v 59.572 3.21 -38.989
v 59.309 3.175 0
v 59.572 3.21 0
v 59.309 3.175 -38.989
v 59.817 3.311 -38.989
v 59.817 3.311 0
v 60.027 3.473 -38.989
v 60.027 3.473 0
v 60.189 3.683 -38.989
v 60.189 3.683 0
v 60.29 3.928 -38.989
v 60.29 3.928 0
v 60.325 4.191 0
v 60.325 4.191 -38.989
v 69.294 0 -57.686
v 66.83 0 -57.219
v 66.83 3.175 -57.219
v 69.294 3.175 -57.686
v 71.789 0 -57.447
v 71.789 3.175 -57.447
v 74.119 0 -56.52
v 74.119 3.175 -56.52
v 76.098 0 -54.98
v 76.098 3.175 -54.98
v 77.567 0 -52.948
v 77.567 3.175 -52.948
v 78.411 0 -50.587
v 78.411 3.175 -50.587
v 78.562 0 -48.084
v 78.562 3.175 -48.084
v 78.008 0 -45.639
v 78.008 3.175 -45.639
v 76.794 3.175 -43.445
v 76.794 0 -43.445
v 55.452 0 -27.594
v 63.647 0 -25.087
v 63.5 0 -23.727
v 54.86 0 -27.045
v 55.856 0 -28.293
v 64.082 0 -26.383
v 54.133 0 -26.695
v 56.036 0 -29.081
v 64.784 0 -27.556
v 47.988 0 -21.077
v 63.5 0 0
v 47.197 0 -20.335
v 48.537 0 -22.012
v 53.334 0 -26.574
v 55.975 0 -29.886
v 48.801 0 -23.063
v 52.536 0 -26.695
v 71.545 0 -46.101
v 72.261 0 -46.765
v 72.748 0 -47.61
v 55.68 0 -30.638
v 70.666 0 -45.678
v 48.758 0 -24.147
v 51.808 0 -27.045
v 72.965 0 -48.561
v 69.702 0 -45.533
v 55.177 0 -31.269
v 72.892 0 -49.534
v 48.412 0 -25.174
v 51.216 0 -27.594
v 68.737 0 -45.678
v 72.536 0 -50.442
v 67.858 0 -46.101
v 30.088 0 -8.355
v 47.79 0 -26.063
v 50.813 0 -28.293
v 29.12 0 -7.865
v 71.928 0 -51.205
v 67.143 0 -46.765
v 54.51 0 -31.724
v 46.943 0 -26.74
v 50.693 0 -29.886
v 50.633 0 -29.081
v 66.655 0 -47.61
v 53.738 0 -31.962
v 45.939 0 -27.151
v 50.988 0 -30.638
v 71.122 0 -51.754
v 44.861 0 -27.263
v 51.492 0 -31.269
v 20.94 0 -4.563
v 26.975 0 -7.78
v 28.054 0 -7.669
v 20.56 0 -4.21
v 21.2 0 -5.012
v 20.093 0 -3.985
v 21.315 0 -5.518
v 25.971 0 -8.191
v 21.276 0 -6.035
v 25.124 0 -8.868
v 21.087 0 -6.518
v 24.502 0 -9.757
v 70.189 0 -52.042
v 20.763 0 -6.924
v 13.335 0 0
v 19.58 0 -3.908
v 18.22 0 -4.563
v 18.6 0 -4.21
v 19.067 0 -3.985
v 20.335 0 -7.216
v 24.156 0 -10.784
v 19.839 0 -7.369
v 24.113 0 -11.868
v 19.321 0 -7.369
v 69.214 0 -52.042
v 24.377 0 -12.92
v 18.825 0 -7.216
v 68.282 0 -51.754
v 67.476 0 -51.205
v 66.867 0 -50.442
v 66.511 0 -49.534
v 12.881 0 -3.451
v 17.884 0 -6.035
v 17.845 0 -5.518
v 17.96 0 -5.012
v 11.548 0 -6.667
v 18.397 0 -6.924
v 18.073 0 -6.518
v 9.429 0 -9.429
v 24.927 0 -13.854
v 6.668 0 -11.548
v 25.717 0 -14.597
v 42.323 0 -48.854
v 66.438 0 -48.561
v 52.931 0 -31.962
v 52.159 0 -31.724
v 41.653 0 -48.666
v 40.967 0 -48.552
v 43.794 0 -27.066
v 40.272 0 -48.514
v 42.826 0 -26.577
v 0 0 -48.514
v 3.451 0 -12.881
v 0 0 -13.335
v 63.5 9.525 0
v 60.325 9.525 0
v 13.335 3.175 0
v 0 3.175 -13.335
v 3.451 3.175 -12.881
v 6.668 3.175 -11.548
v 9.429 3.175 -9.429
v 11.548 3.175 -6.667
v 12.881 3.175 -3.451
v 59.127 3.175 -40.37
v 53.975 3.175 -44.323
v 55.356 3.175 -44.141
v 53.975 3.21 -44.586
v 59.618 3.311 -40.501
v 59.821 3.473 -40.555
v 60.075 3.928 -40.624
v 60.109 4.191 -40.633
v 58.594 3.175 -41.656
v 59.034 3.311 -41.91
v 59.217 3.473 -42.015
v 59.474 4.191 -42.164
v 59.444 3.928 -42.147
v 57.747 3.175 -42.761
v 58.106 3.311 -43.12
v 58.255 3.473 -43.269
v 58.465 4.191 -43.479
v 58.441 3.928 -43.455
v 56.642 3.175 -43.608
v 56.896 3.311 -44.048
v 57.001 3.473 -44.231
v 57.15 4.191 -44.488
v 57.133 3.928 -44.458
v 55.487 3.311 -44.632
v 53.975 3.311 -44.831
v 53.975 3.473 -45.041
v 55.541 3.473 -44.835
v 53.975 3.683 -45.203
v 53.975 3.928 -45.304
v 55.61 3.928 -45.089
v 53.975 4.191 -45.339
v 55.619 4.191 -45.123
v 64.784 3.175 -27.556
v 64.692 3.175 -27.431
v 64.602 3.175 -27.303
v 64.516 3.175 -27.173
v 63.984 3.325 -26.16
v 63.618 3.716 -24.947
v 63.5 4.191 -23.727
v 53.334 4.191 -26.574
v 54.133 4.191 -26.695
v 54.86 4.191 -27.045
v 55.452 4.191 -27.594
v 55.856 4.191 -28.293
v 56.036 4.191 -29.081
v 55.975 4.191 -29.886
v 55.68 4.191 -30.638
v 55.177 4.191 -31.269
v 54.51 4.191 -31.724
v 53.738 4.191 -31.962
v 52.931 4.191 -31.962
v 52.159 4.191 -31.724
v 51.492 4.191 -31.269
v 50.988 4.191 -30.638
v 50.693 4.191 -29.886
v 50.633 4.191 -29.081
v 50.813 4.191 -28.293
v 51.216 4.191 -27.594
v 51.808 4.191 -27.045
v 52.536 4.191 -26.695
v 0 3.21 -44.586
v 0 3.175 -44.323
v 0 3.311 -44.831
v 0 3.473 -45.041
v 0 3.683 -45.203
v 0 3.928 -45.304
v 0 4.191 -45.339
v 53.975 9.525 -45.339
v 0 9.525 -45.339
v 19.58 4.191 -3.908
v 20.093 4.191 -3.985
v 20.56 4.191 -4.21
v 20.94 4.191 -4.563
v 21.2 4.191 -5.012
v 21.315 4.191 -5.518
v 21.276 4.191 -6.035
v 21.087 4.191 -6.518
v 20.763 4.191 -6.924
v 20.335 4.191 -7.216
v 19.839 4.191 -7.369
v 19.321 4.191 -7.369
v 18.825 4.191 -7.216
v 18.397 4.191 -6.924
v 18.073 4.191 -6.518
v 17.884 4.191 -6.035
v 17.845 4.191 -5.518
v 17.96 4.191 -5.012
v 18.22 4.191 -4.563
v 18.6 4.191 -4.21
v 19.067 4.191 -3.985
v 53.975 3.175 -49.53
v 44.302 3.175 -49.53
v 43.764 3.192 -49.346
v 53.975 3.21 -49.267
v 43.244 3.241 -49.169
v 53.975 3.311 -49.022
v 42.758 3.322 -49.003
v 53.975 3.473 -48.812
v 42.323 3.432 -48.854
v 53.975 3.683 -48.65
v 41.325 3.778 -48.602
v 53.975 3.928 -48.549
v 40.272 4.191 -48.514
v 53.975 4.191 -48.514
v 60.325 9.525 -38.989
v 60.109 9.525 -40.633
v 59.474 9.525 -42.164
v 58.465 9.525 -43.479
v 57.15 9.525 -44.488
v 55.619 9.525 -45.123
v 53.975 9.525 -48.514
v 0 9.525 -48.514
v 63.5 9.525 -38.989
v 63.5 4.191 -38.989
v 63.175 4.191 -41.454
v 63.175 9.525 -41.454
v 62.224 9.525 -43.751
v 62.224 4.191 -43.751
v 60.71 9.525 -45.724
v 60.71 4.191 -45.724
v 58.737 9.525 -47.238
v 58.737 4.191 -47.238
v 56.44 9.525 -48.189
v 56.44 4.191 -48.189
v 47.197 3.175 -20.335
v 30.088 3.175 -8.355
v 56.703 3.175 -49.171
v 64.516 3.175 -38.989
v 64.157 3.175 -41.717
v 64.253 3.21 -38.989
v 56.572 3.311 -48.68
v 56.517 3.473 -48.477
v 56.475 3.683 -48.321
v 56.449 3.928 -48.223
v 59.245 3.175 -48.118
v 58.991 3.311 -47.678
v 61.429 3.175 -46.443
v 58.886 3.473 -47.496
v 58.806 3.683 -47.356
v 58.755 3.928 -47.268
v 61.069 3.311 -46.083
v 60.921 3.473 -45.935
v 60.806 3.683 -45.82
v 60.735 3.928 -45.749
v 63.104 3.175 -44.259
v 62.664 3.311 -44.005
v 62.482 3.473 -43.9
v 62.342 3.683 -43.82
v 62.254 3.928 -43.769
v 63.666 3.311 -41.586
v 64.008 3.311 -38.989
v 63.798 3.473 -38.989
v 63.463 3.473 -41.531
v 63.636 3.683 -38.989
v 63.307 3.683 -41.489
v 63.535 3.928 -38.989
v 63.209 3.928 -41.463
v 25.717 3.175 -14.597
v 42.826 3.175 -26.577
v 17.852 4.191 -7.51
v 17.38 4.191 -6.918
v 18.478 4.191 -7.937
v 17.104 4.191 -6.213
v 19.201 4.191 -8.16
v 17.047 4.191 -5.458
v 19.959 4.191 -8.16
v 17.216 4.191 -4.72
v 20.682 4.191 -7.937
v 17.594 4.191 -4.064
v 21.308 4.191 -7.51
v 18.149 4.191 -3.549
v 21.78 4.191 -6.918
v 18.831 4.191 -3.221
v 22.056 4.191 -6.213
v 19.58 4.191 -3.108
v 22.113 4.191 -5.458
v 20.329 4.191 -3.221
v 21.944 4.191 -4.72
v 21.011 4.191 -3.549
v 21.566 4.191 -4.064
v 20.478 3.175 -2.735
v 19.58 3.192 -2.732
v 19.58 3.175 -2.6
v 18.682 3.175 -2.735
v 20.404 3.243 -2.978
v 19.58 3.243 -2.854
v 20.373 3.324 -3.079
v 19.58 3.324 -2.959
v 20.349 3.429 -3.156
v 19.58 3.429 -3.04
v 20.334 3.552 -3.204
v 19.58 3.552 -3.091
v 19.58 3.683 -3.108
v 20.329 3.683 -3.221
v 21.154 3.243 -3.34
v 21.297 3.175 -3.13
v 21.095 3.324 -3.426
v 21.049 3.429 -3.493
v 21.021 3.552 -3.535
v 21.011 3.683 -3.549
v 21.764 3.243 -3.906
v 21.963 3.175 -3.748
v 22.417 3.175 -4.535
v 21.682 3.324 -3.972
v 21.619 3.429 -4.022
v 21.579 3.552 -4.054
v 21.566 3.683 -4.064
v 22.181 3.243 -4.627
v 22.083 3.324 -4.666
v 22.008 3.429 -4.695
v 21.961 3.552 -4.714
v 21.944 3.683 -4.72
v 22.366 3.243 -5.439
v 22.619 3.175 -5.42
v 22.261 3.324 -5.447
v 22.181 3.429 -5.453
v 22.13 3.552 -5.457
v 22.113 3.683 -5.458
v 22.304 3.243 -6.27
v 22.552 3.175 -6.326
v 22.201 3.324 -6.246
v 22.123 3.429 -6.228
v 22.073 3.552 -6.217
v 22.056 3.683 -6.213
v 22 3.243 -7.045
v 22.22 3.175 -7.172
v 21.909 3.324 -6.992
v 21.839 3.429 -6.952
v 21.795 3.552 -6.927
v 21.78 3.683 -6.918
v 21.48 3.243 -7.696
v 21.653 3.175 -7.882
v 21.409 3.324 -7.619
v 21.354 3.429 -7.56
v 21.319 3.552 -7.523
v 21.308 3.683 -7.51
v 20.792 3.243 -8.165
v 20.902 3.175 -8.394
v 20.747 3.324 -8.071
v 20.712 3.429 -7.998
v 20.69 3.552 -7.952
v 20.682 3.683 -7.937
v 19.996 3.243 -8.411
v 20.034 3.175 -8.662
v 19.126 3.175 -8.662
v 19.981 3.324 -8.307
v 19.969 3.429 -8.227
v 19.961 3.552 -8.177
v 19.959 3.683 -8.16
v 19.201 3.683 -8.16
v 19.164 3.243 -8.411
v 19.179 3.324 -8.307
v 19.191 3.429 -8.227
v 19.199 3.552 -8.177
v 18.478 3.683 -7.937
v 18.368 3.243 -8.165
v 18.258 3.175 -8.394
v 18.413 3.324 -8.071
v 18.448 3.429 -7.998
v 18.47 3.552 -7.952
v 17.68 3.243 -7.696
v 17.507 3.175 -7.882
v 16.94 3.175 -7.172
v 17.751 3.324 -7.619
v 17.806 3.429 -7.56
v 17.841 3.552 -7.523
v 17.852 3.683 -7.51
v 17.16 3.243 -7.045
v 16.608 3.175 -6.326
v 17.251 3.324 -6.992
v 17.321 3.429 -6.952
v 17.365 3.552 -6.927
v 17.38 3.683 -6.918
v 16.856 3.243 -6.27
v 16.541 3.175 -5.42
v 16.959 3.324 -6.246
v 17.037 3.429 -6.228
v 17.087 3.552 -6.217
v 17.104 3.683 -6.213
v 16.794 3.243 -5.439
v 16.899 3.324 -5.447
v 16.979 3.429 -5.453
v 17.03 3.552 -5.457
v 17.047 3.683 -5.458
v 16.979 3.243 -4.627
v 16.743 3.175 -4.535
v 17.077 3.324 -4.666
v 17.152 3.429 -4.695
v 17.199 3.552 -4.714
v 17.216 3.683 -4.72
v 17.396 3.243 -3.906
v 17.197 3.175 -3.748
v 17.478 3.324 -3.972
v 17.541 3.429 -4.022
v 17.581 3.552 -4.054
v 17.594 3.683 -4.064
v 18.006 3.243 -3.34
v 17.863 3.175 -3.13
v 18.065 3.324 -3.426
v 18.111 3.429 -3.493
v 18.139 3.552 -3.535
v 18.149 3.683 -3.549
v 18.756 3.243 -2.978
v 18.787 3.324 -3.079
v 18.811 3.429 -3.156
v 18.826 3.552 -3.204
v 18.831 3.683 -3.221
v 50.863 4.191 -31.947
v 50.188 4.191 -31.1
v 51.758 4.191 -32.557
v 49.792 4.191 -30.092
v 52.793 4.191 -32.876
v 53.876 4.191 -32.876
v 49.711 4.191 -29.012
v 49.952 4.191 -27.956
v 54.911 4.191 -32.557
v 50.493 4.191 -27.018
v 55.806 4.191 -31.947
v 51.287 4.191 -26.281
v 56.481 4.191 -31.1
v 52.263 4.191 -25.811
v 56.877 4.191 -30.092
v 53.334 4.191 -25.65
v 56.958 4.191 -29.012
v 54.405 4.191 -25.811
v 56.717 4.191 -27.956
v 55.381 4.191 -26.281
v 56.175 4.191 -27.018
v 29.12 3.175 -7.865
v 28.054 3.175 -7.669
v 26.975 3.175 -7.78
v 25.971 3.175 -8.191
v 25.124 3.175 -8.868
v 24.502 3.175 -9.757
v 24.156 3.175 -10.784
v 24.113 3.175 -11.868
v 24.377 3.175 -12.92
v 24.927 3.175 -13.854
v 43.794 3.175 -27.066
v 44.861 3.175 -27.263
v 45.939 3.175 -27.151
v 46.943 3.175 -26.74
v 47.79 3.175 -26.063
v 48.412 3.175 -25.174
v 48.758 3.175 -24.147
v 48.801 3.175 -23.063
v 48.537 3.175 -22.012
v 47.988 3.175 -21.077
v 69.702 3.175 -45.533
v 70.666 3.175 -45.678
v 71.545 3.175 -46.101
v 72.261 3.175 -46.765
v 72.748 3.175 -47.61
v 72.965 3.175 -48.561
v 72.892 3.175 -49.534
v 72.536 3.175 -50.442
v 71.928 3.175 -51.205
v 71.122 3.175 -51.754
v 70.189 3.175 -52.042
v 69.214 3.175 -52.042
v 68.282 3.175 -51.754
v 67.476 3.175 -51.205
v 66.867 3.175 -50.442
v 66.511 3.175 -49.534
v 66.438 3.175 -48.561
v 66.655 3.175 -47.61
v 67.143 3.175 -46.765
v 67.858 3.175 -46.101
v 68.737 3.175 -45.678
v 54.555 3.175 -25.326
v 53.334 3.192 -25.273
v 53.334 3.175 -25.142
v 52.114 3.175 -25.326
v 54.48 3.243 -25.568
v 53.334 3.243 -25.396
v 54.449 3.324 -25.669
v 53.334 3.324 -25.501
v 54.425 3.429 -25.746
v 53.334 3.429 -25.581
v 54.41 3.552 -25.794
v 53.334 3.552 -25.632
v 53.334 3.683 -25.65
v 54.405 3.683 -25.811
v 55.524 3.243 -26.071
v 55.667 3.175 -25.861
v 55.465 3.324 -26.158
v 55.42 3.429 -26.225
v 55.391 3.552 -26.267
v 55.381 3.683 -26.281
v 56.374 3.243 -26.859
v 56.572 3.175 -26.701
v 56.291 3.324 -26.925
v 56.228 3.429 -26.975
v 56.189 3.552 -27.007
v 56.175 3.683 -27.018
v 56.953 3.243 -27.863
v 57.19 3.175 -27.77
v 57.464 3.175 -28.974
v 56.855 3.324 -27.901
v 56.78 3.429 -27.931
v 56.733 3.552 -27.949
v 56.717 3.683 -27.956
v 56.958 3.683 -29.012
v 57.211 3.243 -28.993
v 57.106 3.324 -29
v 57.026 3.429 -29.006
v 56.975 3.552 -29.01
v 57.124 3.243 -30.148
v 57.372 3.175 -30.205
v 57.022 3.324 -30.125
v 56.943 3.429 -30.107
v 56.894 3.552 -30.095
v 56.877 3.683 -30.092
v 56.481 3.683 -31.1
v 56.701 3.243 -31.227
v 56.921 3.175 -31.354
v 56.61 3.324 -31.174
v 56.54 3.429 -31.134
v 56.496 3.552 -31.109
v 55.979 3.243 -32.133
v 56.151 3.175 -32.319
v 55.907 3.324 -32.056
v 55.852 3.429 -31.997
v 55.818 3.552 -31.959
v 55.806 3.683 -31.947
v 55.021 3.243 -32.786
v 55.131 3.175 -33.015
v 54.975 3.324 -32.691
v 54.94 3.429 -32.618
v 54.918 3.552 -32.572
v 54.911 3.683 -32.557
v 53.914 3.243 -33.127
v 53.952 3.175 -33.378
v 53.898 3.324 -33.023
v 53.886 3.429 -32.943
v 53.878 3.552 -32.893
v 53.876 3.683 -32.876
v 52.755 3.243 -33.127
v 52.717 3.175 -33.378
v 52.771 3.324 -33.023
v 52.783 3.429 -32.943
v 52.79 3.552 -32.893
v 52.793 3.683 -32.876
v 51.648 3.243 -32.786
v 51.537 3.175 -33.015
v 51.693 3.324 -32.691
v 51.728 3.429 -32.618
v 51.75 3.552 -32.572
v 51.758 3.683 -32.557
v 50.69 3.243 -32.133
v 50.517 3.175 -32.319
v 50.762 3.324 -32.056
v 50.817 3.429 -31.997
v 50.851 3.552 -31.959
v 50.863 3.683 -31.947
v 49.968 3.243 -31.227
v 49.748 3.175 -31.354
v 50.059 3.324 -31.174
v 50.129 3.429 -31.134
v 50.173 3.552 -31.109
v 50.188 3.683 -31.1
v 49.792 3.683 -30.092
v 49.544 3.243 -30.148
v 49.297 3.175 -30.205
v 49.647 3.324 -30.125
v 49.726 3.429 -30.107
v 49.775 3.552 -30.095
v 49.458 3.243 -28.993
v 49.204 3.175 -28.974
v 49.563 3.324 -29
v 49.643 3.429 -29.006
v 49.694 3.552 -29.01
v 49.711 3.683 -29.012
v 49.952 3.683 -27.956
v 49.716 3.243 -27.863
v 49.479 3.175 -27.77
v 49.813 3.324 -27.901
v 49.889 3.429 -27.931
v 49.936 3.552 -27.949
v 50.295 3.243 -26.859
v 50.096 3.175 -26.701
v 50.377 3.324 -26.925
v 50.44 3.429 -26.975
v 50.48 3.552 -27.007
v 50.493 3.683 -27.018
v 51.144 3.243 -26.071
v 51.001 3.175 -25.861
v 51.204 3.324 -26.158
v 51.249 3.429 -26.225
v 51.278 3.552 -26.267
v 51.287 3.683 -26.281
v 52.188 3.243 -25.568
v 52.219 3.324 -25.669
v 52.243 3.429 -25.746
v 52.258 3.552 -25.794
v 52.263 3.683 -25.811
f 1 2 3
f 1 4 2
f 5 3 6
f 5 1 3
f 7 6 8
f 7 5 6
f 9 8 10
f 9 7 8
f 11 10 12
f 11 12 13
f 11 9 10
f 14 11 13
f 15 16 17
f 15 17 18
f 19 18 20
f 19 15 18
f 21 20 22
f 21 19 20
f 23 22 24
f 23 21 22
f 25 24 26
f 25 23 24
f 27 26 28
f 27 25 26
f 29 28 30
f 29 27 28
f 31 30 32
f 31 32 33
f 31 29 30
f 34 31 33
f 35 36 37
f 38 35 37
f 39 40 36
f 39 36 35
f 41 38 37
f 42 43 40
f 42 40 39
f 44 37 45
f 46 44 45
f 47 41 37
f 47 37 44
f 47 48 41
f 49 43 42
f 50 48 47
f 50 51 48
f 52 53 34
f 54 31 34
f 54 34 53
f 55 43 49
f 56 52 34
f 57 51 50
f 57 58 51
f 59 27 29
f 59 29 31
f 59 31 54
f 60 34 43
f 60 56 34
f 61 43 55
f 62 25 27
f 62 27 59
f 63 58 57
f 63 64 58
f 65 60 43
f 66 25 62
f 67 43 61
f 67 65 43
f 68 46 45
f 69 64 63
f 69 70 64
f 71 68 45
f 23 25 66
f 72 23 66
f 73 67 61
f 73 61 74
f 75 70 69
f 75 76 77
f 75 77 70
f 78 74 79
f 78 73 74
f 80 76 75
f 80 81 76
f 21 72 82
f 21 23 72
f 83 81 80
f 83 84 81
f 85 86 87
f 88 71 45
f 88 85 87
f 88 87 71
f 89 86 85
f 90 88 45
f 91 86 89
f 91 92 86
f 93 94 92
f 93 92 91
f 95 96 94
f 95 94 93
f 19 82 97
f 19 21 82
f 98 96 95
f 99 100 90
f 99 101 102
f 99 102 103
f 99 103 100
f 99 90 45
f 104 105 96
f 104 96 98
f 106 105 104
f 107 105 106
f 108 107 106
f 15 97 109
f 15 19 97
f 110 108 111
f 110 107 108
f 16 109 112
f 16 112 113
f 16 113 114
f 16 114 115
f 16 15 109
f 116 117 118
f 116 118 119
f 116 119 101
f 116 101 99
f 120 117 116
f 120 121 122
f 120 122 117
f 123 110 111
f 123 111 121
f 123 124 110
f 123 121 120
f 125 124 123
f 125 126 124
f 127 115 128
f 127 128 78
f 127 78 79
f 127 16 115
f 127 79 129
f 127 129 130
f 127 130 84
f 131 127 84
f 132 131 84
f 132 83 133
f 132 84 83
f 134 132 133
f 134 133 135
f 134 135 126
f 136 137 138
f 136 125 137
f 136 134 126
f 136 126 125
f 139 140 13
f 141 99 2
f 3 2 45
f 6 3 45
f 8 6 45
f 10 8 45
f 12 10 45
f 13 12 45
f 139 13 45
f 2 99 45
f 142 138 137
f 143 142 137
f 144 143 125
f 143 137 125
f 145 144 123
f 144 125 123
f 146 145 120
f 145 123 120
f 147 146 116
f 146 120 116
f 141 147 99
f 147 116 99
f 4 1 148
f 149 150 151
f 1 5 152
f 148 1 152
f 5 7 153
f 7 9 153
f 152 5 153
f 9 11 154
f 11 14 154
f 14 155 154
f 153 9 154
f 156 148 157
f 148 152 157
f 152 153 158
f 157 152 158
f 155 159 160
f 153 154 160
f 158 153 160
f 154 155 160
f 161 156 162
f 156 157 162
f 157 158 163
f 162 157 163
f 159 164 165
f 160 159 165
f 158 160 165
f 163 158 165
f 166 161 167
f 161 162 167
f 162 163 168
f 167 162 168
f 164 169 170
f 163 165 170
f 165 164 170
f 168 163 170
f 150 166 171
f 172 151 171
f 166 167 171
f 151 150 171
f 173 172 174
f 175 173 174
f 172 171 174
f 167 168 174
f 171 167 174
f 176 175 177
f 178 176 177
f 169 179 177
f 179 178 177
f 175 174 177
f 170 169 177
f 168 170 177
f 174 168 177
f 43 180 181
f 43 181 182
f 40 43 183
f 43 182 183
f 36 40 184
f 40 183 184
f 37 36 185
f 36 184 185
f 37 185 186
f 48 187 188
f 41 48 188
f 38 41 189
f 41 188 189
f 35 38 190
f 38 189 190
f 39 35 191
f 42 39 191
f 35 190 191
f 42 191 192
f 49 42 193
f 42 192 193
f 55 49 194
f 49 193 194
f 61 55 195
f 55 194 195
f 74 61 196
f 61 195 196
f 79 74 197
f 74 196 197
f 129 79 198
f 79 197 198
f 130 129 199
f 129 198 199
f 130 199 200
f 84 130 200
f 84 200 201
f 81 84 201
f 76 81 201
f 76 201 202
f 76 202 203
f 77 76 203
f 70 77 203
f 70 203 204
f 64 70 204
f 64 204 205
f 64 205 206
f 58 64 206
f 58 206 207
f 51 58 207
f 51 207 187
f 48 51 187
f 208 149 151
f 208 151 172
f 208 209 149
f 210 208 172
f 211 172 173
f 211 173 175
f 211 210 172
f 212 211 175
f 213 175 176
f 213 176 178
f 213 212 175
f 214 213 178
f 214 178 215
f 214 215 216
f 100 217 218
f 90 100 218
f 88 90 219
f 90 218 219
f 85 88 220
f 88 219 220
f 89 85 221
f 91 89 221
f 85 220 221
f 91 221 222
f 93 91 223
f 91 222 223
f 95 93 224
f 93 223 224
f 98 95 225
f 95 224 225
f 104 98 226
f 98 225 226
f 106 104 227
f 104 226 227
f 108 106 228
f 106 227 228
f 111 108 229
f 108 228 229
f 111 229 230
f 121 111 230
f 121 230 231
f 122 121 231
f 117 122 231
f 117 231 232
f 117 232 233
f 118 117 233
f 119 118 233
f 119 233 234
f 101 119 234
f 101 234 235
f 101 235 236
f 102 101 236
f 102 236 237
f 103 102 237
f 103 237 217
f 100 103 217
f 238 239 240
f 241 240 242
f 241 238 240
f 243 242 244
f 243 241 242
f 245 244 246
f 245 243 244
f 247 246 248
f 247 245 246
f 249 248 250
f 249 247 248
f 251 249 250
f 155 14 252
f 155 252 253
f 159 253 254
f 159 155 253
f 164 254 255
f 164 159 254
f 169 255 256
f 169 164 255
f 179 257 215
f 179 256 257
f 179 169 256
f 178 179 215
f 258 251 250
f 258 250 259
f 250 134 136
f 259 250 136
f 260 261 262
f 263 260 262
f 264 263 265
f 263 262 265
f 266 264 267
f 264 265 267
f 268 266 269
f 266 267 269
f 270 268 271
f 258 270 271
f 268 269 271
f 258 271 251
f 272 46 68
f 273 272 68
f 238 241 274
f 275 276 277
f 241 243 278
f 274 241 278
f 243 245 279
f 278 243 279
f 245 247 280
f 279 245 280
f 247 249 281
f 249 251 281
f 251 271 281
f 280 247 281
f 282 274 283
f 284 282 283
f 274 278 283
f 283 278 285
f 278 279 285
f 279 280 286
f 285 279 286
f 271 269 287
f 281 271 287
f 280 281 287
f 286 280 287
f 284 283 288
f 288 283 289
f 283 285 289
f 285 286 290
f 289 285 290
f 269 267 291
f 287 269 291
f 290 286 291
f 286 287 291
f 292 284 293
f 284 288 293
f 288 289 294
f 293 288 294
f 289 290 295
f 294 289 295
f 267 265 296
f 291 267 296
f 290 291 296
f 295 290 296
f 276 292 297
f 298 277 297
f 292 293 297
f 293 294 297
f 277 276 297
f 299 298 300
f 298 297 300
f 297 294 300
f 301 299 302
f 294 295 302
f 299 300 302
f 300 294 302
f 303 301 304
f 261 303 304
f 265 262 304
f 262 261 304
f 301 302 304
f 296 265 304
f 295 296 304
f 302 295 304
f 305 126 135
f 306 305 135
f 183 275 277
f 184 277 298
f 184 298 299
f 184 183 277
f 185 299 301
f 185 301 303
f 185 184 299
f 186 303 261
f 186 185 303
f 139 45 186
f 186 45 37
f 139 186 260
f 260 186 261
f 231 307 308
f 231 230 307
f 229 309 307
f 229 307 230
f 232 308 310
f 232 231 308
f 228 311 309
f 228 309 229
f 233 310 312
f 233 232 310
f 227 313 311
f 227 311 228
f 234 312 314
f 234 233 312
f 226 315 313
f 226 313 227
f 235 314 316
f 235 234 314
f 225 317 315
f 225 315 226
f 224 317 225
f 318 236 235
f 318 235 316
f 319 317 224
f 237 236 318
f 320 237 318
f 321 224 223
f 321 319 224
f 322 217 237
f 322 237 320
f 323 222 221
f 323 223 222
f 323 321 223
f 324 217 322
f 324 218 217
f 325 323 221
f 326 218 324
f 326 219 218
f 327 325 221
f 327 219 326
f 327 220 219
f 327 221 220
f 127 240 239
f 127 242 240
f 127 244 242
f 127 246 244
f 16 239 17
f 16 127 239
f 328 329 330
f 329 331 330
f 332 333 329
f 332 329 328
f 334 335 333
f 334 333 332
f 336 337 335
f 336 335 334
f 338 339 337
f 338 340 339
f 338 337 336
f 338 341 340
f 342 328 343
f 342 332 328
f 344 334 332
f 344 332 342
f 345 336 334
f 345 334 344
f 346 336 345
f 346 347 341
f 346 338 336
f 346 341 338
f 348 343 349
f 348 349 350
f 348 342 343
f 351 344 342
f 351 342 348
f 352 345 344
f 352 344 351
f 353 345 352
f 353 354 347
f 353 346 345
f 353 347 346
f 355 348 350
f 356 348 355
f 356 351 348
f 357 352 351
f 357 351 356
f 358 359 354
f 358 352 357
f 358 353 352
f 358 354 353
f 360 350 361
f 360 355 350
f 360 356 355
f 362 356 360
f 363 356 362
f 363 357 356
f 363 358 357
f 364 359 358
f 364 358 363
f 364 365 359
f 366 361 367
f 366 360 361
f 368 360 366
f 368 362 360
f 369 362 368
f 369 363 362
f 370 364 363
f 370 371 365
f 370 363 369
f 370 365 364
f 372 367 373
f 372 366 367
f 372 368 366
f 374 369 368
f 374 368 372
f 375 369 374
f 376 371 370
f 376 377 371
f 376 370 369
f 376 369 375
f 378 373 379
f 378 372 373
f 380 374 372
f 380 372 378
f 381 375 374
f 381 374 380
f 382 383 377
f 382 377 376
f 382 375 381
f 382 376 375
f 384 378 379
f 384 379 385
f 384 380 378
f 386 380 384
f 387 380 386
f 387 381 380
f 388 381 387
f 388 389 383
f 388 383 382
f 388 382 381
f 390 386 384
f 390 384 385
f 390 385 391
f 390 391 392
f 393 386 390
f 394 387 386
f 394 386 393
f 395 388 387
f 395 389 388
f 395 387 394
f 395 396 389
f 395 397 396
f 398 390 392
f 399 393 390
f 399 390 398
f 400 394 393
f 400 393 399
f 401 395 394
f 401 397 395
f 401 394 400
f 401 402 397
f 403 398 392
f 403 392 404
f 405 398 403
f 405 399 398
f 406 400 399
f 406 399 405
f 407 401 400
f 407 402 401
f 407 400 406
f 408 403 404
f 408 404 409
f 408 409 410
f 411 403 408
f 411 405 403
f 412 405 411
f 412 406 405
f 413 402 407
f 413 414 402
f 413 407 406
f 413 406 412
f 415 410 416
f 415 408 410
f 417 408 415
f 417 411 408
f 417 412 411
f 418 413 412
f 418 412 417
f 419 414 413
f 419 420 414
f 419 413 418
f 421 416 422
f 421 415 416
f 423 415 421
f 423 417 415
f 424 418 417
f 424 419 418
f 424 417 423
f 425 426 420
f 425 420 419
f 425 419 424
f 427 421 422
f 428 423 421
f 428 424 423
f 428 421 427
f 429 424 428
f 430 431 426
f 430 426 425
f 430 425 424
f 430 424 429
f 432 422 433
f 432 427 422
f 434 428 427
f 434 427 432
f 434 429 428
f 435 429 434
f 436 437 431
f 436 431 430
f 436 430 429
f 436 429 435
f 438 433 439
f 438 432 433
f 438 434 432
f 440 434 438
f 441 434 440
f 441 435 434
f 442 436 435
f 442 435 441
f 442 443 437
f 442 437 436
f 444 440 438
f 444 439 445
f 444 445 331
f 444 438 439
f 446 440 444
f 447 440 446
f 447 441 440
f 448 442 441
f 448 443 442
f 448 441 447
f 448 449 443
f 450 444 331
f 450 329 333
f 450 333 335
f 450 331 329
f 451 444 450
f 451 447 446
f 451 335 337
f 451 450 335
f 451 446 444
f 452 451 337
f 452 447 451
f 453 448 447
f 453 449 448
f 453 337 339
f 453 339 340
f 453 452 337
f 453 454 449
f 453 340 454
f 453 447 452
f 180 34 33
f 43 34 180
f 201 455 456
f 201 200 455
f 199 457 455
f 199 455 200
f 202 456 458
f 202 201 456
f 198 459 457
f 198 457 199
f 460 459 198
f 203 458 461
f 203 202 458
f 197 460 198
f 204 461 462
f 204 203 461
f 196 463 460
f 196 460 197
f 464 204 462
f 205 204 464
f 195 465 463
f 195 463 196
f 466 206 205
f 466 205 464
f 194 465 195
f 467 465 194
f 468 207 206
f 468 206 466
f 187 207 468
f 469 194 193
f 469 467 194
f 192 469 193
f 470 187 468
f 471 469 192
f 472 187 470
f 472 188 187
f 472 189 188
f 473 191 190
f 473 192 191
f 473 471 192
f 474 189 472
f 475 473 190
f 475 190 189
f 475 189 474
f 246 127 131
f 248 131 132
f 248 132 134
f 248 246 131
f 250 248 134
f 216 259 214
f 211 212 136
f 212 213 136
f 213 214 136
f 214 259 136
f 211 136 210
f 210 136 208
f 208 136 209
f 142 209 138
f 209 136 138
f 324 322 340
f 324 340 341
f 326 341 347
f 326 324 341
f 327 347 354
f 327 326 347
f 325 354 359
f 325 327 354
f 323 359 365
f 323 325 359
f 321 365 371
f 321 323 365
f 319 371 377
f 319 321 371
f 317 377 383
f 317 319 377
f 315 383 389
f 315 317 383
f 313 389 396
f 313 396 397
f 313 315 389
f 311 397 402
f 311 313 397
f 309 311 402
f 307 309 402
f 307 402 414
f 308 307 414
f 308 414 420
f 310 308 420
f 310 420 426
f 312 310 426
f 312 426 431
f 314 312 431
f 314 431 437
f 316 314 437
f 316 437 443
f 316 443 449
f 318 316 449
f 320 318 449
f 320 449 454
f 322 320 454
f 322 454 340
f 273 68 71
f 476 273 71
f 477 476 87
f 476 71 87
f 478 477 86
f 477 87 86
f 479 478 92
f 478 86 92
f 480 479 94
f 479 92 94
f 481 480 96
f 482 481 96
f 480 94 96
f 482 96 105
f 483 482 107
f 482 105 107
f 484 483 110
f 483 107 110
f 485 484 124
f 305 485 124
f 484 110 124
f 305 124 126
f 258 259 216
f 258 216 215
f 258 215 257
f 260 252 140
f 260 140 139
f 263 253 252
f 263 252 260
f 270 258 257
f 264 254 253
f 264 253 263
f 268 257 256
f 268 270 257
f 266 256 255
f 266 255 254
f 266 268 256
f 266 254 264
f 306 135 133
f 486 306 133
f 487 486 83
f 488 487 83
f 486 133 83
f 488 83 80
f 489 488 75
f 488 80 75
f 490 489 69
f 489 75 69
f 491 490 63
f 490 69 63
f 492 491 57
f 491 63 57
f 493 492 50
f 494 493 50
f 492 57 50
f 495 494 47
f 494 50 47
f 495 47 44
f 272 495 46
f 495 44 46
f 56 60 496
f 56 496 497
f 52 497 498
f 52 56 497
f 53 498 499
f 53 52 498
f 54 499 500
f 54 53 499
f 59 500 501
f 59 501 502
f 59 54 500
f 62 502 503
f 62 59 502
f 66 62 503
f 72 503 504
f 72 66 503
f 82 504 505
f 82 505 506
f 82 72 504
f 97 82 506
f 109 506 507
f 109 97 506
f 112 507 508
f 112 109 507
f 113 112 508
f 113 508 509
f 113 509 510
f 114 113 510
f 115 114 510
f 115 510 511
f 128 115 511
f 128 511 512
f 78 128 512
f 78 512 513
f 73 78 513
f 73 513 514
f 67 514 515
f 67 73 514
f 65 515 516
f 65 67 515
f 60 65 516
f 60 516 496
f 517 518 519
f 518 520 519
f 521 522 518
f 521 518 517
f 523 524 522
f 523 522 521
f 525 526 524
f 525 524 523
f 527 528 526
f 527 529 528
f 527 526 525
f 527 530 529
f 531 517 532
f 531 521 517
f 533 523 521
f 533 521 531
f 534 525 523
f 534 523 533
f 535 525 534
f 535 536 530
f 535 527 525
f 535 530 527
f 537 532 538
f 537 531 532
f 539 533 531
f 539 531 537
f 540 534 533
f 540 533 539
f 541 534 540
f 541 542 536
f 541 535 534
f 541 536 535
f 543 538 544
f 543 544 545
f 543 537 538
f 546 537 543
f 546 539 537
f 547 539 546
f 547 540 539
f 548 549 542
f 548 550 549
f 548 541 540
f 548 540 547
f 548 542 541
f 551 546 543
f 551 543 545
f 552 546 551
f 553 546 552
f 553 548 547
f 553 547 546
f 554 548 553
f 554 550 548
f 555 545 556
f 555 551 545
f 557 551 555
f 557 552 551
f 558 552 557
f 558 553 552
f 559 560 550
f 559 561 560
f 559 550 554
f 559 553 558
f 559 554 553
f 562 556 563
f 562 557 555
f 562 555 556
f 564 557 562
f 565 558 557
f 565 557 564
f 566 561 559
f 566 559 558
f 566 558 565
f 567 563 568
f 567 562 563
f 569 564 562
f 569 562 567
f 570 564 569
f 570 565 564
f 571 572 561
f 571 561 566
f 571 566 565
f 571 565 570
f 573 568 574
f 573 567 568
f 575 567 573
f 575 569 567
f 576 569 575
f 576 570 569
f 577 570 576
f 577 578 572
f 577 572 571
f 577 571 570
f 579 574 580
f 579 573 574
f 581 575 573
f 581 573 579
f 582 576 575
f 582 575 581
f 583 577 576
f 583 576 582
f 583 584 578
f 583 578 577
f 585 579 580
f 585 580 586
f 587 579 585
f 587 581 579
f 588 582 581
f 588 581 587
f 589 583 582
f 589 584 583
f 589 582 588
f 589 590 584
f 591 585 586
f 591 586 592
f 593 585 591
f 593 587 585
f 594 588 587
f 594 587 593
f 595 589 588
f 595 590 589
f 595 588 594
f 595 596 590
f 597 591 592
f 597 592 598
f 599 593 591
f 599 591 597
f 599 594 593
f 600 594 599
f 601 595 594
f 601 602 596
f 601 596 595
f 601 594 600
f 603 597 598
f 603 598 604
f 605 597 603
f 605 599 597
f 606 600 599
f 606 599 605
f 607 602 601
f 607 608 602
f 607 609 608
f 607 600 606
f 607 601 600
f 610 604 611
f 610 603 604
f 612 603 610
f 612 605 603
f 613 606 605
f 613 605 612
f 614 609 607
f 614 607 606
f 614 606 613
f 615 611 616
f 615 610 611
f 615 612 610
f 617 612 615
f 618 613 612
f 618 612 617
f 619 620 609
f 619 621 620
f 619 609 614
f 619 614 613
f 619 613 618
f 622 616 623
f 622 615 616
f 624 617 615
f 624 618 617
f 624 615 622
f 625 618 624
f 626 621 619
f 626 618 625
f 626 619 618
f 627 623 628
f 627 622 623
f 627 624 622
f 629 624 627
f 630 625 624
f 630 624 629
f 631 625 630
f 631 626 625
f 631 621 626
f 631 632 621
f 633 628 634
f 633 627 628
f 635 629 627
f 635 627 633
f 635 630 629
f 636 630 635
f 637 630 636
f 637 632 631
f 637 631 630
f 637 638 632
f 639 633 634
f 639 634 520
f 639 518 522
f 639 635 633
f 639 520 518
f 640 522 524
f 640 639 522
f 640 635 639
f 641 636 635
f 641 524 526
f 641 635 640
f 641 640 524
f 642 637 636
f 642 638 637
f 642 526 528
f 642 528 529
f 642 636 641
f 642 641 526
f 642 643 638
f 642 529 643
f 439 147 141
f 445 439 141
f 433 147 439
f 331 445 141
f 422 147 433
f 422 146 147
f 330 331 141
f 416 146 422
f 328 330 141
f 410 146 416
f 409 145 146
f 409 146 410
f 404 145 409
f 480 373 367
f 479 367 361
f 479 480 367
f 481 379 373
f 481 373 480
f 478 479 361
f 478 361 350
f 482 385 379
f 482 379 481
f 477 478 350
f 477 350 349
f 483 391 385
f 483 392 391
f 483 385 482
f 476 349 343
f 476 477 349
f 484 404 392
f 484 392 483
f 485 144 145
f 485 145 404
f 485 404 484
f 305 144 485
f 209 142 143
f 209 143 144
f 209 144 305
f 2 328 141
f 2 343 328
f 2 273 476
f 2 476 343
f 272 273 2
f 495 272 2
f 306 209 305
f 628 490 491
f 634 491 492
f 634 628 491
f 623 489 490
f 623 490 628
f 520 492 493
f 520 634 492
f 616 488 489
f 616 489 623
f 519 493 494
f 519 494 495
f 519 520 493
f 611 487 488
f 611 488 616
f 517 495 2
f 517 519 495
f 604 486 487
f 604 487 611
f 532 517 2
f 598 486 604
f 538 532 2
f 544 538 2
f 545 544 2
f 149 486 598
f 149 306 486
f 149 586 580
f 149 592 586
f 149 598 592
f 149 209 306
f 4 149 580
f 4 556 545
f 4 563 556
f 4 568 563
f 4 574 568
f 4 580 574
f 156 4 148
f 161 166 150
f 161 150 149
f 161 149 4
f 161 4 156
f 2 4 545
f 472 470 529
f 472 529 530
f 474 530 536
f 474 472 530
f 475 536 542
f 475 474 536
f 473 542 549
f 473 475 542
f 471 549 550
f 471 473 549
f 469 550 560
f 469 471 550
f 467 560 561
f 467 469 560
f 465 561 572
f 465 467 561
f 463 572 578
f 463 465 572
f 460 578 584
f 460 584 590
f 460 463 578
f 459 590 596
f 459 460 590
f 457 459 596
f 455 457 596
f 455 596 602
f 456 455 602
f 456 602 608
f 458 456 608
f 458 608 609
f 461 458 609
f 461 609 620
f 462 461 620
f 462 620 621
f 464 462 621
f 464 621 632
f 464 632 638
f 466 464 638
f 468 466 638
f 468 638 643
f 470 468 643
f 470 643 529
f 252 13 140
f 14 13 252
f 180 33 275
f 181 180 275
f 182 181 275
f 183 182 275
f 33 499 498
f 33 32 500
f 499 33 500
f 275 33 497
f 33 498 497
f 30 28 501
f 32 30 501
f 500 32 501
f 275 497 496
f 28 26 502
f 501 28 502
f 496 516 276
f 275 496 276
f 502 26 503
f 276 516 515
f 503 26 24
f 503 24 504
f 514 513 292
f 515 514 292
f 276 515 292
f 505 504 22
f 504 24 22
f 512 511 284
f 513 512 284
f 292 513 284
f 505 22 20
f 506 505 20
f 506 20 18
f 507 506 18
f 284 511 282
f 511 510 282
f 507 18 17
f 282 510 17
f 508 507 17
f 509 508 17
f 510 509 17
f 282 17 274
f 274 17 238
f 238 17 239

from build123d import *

# Parameters (mm, degrees)
EXTRUDE1_DEPTH = 9.525
SHELL1_T       = -3.175
SKETCH4_R      = 3.2729084122023364
EXTRUDE2_DEPTH = 3.175
FILLET1_R      = 6.35
FILLET2_R      = 1.016
EXTRUDE3_REACH = 99.642
SKETCH5_R      = 3.633554116992031
SKETCH5_R_2    = 2.5400000000000023
SKETCH6_R      = 2.7088319516261428
SKETCH6_R_2    = 1.739899999999999
EXTRUDE4_DEPTH = 98.64160513278141
FILLET3_R      = 0.508


with BuildPart() as part:
    # Sketch1 → Extrude1 (new body)
    with BuildSketch(Plane(origin=(0, 0, 0), x_dir=(1, 0, 0), z_dir=(0, 1, 0))):
        with BuildLine():
            Line((13.334999999999999, 0), (63.5, 0))
            Line((63.5, 0), (63.5, 38.988999999999926))
            ThreePointArc((63.5, 38.988999999999926), (60.71019209080187, 45.724192090801864), (53.97499999999993, 48.513999999999996))
            Line((53.97499999999993, 48.513999999999996), (0, 48.513999999999996))
            Line((0, 48.513999999999996), (0, 13.334999999999999))
            ThreePointArc((0, 13.334999999999999), (9.429268927122612, 9.42926892712261), (13.334999999999999, 0))
        make_face()
        with BuildLine():
            Line((25.717261934170715, 14.596576467420496), (42.82641557504918, 26.576534819151746))
            ThreePointArc((42.82641557504918, 26.576534819151746), (48.13271108628772, 25.640891752908175), (47.19706802004417, 20.334596241669633))
            Line((47.19706802004417, 20.334596241669633), (30.087914379165696, 8.354637889938386))
            ThreePointArc((30.087914379165696, 8.354637889938386), (24.78161886792715, 9.29028095618195), (25.717261934170715, 14.596576467420496))
        make_face(mode=Mode.SUBTRACT)
    extrude(amount=EXTRUDE1_DEPTH)

    # Shell1
    shell1_openings = [part.faces().sort_by_distance(p)[0] for p in [
        (38.4175, 4.7625, 0),
        (9.429268927, 4.7625, -9.429268927),
        (0, 4.7625, -30.9245),
        (32.524178478, 9.525, -25.566315858),
        (24.781618868, 4.7625, -9.290280956),
        (38.6424912, 4.7625, -14.344617066),
        (48.132711086, 4.7625, -25.640891753),
        (34.271838755, 4.7625, -20.586555643),
    ]]
    offset(amount=SHELL1_T, openings=shell1_openings, kind=Kind.INTERSECTION)

    # Sketch4 → Extrude2 (add)
    with BuildSketch(Plane(origin=(0, 0, 0), x_dir=(1, 0, 0), z_dir=(0, 1, 0))):
        with BuildLine():
            Line((41.325799999999994, 48.513999999999996), (66.82999351166346, 57.21904298473958))
            ThreePointArc((66.82999351166346, 57.21904298473958), (76.90463826764335, 54.01609142946003), (76.79370933191484, 43.445137811366784))
            Line((76.79370933191484, 43.445137811366784), (63.5, 25.8572))
            Line((63.5, 25.8572), (63.5, 38.988999999999926))
            ThreePointArc((63.5, 38.988999999999926), (60.71019209080187, 45.724192090801864), (53.97499999999993, 48.513999999999996))
            Line((53.97499999999993, 48.513999999999996), (41.325799999999994, 48.513999999999996))
        make_face()
        with Locations(Location((69.70164744855023, 48.8056189691106, 0), (0, 0, 270))):
            Circle(SKETCH4_R, mode=Mode.SUBTRACT)
    extrude(amount=EXTRUDE2_DEPTH)

    # Fillet1
    fillet1_edges = [part.edges().sort_by_distance(p)[0] for p in [
        (41.325799999999994, 1.5875, -48.513999999999996),
        (63.5, 1.5875, -25.8572),
    ]]
    fillet(fillet1_edges, radius=FILLET1_R)

    # Fillet2
    fillet2_edges = [part.edges().sort_by_distance(p)[0] for p in [
        (47.12348109415911, 3.175, -48.513999999999996),
        (26.987500000000004, 3.175, -45.339),
        (58.46512806053458, 3.175, -43.47912806053458),
        (60.325, 3.175, -19.494500000000002),
        (60.71019209080187, 3.175, -45.724192090801864),
        (63.5, 3.175, -31.358185610352162),
    ]]
    fillet(fillet2_edges, radius=FILLET2_R)

    # Sketch5 → Extrude3 (add, up to next)
    with BuildSketch(Plane(origin=(0, 4.191000000000001, 0), x_dir=(-1, 0, 0), z_dir=(0, 1, 0)), mode=Mode.PRIVATE) as extrude3_sk1:
        with Locations(Location((-53.334326567522815, -29.283102123737322, 0), (0, 0, 90))):
            Circle(SKETCH5_R)
    extrude3_tool1 = extrude(extrude3_sk1.sketch, amount=-EXTRUDE3_REACH, mode=Mode.PRIVATE) - part.part
    # Sketch5 → Extrude3 (add, up to next)
    with BuildSketch(Plane(origin=(0, 4.191000000000001, 0), x_dir=(-1, 0, 0), z_dir=(0, 1, 0)), mode=Mode.PRIVATE) as extrude3_sk2:
        with Locations(Location((-19.58000338669206, -5.648070585352799, 0), (0, 0, 90))):
            Circle(SKETCH5_R_2)
    extrude3_tool2 = extrude(extrude3_sk2.sketch, amount=-EXTRUDE3_REACH, mode=Mode.PRIVATE) - part.part
    add(extrude3_tool1.solids().sort_by_distance((53.334327, 4.191, -29.283102))[0])
    add(extrude3_tool2.solids().sort_by_distance((19.580003, 4.191, -5.648071))[0])

    # Sketch6 → Extrude4 (cut, through all)
    with BuildSketch(Plane(origin=(0, 4.191000000000001, 0), x_dir=(-1, 0, 0), z_dir=(0, 1, 0))):
        with Locations(Location((-53.334326567522815, -29.283102123737322, 0), (0, 0, 90))):
            Circle(SKETCH6_R)
        with Locations(Location((-19.58000338669206, -5.648070585352799, 0), (0, 0, 90))):
            Circle(SKETCH6_R_2)
    extrude(amount=-EXTRUDE4_DEPTH, mode=Mode.SUBTRACT)

    # Fillet3
    fillet3_edges = [part.edges().sort_by_distance(p)[0] for p in [
        (19.58000338669206, 3.175, -8.1880705853528),
        (53.334326567522815, 3.175, -32.91665624072935),
    ]]
    fillet(fillet3_edges, radius=FILLET3_R)


solid = part.part
